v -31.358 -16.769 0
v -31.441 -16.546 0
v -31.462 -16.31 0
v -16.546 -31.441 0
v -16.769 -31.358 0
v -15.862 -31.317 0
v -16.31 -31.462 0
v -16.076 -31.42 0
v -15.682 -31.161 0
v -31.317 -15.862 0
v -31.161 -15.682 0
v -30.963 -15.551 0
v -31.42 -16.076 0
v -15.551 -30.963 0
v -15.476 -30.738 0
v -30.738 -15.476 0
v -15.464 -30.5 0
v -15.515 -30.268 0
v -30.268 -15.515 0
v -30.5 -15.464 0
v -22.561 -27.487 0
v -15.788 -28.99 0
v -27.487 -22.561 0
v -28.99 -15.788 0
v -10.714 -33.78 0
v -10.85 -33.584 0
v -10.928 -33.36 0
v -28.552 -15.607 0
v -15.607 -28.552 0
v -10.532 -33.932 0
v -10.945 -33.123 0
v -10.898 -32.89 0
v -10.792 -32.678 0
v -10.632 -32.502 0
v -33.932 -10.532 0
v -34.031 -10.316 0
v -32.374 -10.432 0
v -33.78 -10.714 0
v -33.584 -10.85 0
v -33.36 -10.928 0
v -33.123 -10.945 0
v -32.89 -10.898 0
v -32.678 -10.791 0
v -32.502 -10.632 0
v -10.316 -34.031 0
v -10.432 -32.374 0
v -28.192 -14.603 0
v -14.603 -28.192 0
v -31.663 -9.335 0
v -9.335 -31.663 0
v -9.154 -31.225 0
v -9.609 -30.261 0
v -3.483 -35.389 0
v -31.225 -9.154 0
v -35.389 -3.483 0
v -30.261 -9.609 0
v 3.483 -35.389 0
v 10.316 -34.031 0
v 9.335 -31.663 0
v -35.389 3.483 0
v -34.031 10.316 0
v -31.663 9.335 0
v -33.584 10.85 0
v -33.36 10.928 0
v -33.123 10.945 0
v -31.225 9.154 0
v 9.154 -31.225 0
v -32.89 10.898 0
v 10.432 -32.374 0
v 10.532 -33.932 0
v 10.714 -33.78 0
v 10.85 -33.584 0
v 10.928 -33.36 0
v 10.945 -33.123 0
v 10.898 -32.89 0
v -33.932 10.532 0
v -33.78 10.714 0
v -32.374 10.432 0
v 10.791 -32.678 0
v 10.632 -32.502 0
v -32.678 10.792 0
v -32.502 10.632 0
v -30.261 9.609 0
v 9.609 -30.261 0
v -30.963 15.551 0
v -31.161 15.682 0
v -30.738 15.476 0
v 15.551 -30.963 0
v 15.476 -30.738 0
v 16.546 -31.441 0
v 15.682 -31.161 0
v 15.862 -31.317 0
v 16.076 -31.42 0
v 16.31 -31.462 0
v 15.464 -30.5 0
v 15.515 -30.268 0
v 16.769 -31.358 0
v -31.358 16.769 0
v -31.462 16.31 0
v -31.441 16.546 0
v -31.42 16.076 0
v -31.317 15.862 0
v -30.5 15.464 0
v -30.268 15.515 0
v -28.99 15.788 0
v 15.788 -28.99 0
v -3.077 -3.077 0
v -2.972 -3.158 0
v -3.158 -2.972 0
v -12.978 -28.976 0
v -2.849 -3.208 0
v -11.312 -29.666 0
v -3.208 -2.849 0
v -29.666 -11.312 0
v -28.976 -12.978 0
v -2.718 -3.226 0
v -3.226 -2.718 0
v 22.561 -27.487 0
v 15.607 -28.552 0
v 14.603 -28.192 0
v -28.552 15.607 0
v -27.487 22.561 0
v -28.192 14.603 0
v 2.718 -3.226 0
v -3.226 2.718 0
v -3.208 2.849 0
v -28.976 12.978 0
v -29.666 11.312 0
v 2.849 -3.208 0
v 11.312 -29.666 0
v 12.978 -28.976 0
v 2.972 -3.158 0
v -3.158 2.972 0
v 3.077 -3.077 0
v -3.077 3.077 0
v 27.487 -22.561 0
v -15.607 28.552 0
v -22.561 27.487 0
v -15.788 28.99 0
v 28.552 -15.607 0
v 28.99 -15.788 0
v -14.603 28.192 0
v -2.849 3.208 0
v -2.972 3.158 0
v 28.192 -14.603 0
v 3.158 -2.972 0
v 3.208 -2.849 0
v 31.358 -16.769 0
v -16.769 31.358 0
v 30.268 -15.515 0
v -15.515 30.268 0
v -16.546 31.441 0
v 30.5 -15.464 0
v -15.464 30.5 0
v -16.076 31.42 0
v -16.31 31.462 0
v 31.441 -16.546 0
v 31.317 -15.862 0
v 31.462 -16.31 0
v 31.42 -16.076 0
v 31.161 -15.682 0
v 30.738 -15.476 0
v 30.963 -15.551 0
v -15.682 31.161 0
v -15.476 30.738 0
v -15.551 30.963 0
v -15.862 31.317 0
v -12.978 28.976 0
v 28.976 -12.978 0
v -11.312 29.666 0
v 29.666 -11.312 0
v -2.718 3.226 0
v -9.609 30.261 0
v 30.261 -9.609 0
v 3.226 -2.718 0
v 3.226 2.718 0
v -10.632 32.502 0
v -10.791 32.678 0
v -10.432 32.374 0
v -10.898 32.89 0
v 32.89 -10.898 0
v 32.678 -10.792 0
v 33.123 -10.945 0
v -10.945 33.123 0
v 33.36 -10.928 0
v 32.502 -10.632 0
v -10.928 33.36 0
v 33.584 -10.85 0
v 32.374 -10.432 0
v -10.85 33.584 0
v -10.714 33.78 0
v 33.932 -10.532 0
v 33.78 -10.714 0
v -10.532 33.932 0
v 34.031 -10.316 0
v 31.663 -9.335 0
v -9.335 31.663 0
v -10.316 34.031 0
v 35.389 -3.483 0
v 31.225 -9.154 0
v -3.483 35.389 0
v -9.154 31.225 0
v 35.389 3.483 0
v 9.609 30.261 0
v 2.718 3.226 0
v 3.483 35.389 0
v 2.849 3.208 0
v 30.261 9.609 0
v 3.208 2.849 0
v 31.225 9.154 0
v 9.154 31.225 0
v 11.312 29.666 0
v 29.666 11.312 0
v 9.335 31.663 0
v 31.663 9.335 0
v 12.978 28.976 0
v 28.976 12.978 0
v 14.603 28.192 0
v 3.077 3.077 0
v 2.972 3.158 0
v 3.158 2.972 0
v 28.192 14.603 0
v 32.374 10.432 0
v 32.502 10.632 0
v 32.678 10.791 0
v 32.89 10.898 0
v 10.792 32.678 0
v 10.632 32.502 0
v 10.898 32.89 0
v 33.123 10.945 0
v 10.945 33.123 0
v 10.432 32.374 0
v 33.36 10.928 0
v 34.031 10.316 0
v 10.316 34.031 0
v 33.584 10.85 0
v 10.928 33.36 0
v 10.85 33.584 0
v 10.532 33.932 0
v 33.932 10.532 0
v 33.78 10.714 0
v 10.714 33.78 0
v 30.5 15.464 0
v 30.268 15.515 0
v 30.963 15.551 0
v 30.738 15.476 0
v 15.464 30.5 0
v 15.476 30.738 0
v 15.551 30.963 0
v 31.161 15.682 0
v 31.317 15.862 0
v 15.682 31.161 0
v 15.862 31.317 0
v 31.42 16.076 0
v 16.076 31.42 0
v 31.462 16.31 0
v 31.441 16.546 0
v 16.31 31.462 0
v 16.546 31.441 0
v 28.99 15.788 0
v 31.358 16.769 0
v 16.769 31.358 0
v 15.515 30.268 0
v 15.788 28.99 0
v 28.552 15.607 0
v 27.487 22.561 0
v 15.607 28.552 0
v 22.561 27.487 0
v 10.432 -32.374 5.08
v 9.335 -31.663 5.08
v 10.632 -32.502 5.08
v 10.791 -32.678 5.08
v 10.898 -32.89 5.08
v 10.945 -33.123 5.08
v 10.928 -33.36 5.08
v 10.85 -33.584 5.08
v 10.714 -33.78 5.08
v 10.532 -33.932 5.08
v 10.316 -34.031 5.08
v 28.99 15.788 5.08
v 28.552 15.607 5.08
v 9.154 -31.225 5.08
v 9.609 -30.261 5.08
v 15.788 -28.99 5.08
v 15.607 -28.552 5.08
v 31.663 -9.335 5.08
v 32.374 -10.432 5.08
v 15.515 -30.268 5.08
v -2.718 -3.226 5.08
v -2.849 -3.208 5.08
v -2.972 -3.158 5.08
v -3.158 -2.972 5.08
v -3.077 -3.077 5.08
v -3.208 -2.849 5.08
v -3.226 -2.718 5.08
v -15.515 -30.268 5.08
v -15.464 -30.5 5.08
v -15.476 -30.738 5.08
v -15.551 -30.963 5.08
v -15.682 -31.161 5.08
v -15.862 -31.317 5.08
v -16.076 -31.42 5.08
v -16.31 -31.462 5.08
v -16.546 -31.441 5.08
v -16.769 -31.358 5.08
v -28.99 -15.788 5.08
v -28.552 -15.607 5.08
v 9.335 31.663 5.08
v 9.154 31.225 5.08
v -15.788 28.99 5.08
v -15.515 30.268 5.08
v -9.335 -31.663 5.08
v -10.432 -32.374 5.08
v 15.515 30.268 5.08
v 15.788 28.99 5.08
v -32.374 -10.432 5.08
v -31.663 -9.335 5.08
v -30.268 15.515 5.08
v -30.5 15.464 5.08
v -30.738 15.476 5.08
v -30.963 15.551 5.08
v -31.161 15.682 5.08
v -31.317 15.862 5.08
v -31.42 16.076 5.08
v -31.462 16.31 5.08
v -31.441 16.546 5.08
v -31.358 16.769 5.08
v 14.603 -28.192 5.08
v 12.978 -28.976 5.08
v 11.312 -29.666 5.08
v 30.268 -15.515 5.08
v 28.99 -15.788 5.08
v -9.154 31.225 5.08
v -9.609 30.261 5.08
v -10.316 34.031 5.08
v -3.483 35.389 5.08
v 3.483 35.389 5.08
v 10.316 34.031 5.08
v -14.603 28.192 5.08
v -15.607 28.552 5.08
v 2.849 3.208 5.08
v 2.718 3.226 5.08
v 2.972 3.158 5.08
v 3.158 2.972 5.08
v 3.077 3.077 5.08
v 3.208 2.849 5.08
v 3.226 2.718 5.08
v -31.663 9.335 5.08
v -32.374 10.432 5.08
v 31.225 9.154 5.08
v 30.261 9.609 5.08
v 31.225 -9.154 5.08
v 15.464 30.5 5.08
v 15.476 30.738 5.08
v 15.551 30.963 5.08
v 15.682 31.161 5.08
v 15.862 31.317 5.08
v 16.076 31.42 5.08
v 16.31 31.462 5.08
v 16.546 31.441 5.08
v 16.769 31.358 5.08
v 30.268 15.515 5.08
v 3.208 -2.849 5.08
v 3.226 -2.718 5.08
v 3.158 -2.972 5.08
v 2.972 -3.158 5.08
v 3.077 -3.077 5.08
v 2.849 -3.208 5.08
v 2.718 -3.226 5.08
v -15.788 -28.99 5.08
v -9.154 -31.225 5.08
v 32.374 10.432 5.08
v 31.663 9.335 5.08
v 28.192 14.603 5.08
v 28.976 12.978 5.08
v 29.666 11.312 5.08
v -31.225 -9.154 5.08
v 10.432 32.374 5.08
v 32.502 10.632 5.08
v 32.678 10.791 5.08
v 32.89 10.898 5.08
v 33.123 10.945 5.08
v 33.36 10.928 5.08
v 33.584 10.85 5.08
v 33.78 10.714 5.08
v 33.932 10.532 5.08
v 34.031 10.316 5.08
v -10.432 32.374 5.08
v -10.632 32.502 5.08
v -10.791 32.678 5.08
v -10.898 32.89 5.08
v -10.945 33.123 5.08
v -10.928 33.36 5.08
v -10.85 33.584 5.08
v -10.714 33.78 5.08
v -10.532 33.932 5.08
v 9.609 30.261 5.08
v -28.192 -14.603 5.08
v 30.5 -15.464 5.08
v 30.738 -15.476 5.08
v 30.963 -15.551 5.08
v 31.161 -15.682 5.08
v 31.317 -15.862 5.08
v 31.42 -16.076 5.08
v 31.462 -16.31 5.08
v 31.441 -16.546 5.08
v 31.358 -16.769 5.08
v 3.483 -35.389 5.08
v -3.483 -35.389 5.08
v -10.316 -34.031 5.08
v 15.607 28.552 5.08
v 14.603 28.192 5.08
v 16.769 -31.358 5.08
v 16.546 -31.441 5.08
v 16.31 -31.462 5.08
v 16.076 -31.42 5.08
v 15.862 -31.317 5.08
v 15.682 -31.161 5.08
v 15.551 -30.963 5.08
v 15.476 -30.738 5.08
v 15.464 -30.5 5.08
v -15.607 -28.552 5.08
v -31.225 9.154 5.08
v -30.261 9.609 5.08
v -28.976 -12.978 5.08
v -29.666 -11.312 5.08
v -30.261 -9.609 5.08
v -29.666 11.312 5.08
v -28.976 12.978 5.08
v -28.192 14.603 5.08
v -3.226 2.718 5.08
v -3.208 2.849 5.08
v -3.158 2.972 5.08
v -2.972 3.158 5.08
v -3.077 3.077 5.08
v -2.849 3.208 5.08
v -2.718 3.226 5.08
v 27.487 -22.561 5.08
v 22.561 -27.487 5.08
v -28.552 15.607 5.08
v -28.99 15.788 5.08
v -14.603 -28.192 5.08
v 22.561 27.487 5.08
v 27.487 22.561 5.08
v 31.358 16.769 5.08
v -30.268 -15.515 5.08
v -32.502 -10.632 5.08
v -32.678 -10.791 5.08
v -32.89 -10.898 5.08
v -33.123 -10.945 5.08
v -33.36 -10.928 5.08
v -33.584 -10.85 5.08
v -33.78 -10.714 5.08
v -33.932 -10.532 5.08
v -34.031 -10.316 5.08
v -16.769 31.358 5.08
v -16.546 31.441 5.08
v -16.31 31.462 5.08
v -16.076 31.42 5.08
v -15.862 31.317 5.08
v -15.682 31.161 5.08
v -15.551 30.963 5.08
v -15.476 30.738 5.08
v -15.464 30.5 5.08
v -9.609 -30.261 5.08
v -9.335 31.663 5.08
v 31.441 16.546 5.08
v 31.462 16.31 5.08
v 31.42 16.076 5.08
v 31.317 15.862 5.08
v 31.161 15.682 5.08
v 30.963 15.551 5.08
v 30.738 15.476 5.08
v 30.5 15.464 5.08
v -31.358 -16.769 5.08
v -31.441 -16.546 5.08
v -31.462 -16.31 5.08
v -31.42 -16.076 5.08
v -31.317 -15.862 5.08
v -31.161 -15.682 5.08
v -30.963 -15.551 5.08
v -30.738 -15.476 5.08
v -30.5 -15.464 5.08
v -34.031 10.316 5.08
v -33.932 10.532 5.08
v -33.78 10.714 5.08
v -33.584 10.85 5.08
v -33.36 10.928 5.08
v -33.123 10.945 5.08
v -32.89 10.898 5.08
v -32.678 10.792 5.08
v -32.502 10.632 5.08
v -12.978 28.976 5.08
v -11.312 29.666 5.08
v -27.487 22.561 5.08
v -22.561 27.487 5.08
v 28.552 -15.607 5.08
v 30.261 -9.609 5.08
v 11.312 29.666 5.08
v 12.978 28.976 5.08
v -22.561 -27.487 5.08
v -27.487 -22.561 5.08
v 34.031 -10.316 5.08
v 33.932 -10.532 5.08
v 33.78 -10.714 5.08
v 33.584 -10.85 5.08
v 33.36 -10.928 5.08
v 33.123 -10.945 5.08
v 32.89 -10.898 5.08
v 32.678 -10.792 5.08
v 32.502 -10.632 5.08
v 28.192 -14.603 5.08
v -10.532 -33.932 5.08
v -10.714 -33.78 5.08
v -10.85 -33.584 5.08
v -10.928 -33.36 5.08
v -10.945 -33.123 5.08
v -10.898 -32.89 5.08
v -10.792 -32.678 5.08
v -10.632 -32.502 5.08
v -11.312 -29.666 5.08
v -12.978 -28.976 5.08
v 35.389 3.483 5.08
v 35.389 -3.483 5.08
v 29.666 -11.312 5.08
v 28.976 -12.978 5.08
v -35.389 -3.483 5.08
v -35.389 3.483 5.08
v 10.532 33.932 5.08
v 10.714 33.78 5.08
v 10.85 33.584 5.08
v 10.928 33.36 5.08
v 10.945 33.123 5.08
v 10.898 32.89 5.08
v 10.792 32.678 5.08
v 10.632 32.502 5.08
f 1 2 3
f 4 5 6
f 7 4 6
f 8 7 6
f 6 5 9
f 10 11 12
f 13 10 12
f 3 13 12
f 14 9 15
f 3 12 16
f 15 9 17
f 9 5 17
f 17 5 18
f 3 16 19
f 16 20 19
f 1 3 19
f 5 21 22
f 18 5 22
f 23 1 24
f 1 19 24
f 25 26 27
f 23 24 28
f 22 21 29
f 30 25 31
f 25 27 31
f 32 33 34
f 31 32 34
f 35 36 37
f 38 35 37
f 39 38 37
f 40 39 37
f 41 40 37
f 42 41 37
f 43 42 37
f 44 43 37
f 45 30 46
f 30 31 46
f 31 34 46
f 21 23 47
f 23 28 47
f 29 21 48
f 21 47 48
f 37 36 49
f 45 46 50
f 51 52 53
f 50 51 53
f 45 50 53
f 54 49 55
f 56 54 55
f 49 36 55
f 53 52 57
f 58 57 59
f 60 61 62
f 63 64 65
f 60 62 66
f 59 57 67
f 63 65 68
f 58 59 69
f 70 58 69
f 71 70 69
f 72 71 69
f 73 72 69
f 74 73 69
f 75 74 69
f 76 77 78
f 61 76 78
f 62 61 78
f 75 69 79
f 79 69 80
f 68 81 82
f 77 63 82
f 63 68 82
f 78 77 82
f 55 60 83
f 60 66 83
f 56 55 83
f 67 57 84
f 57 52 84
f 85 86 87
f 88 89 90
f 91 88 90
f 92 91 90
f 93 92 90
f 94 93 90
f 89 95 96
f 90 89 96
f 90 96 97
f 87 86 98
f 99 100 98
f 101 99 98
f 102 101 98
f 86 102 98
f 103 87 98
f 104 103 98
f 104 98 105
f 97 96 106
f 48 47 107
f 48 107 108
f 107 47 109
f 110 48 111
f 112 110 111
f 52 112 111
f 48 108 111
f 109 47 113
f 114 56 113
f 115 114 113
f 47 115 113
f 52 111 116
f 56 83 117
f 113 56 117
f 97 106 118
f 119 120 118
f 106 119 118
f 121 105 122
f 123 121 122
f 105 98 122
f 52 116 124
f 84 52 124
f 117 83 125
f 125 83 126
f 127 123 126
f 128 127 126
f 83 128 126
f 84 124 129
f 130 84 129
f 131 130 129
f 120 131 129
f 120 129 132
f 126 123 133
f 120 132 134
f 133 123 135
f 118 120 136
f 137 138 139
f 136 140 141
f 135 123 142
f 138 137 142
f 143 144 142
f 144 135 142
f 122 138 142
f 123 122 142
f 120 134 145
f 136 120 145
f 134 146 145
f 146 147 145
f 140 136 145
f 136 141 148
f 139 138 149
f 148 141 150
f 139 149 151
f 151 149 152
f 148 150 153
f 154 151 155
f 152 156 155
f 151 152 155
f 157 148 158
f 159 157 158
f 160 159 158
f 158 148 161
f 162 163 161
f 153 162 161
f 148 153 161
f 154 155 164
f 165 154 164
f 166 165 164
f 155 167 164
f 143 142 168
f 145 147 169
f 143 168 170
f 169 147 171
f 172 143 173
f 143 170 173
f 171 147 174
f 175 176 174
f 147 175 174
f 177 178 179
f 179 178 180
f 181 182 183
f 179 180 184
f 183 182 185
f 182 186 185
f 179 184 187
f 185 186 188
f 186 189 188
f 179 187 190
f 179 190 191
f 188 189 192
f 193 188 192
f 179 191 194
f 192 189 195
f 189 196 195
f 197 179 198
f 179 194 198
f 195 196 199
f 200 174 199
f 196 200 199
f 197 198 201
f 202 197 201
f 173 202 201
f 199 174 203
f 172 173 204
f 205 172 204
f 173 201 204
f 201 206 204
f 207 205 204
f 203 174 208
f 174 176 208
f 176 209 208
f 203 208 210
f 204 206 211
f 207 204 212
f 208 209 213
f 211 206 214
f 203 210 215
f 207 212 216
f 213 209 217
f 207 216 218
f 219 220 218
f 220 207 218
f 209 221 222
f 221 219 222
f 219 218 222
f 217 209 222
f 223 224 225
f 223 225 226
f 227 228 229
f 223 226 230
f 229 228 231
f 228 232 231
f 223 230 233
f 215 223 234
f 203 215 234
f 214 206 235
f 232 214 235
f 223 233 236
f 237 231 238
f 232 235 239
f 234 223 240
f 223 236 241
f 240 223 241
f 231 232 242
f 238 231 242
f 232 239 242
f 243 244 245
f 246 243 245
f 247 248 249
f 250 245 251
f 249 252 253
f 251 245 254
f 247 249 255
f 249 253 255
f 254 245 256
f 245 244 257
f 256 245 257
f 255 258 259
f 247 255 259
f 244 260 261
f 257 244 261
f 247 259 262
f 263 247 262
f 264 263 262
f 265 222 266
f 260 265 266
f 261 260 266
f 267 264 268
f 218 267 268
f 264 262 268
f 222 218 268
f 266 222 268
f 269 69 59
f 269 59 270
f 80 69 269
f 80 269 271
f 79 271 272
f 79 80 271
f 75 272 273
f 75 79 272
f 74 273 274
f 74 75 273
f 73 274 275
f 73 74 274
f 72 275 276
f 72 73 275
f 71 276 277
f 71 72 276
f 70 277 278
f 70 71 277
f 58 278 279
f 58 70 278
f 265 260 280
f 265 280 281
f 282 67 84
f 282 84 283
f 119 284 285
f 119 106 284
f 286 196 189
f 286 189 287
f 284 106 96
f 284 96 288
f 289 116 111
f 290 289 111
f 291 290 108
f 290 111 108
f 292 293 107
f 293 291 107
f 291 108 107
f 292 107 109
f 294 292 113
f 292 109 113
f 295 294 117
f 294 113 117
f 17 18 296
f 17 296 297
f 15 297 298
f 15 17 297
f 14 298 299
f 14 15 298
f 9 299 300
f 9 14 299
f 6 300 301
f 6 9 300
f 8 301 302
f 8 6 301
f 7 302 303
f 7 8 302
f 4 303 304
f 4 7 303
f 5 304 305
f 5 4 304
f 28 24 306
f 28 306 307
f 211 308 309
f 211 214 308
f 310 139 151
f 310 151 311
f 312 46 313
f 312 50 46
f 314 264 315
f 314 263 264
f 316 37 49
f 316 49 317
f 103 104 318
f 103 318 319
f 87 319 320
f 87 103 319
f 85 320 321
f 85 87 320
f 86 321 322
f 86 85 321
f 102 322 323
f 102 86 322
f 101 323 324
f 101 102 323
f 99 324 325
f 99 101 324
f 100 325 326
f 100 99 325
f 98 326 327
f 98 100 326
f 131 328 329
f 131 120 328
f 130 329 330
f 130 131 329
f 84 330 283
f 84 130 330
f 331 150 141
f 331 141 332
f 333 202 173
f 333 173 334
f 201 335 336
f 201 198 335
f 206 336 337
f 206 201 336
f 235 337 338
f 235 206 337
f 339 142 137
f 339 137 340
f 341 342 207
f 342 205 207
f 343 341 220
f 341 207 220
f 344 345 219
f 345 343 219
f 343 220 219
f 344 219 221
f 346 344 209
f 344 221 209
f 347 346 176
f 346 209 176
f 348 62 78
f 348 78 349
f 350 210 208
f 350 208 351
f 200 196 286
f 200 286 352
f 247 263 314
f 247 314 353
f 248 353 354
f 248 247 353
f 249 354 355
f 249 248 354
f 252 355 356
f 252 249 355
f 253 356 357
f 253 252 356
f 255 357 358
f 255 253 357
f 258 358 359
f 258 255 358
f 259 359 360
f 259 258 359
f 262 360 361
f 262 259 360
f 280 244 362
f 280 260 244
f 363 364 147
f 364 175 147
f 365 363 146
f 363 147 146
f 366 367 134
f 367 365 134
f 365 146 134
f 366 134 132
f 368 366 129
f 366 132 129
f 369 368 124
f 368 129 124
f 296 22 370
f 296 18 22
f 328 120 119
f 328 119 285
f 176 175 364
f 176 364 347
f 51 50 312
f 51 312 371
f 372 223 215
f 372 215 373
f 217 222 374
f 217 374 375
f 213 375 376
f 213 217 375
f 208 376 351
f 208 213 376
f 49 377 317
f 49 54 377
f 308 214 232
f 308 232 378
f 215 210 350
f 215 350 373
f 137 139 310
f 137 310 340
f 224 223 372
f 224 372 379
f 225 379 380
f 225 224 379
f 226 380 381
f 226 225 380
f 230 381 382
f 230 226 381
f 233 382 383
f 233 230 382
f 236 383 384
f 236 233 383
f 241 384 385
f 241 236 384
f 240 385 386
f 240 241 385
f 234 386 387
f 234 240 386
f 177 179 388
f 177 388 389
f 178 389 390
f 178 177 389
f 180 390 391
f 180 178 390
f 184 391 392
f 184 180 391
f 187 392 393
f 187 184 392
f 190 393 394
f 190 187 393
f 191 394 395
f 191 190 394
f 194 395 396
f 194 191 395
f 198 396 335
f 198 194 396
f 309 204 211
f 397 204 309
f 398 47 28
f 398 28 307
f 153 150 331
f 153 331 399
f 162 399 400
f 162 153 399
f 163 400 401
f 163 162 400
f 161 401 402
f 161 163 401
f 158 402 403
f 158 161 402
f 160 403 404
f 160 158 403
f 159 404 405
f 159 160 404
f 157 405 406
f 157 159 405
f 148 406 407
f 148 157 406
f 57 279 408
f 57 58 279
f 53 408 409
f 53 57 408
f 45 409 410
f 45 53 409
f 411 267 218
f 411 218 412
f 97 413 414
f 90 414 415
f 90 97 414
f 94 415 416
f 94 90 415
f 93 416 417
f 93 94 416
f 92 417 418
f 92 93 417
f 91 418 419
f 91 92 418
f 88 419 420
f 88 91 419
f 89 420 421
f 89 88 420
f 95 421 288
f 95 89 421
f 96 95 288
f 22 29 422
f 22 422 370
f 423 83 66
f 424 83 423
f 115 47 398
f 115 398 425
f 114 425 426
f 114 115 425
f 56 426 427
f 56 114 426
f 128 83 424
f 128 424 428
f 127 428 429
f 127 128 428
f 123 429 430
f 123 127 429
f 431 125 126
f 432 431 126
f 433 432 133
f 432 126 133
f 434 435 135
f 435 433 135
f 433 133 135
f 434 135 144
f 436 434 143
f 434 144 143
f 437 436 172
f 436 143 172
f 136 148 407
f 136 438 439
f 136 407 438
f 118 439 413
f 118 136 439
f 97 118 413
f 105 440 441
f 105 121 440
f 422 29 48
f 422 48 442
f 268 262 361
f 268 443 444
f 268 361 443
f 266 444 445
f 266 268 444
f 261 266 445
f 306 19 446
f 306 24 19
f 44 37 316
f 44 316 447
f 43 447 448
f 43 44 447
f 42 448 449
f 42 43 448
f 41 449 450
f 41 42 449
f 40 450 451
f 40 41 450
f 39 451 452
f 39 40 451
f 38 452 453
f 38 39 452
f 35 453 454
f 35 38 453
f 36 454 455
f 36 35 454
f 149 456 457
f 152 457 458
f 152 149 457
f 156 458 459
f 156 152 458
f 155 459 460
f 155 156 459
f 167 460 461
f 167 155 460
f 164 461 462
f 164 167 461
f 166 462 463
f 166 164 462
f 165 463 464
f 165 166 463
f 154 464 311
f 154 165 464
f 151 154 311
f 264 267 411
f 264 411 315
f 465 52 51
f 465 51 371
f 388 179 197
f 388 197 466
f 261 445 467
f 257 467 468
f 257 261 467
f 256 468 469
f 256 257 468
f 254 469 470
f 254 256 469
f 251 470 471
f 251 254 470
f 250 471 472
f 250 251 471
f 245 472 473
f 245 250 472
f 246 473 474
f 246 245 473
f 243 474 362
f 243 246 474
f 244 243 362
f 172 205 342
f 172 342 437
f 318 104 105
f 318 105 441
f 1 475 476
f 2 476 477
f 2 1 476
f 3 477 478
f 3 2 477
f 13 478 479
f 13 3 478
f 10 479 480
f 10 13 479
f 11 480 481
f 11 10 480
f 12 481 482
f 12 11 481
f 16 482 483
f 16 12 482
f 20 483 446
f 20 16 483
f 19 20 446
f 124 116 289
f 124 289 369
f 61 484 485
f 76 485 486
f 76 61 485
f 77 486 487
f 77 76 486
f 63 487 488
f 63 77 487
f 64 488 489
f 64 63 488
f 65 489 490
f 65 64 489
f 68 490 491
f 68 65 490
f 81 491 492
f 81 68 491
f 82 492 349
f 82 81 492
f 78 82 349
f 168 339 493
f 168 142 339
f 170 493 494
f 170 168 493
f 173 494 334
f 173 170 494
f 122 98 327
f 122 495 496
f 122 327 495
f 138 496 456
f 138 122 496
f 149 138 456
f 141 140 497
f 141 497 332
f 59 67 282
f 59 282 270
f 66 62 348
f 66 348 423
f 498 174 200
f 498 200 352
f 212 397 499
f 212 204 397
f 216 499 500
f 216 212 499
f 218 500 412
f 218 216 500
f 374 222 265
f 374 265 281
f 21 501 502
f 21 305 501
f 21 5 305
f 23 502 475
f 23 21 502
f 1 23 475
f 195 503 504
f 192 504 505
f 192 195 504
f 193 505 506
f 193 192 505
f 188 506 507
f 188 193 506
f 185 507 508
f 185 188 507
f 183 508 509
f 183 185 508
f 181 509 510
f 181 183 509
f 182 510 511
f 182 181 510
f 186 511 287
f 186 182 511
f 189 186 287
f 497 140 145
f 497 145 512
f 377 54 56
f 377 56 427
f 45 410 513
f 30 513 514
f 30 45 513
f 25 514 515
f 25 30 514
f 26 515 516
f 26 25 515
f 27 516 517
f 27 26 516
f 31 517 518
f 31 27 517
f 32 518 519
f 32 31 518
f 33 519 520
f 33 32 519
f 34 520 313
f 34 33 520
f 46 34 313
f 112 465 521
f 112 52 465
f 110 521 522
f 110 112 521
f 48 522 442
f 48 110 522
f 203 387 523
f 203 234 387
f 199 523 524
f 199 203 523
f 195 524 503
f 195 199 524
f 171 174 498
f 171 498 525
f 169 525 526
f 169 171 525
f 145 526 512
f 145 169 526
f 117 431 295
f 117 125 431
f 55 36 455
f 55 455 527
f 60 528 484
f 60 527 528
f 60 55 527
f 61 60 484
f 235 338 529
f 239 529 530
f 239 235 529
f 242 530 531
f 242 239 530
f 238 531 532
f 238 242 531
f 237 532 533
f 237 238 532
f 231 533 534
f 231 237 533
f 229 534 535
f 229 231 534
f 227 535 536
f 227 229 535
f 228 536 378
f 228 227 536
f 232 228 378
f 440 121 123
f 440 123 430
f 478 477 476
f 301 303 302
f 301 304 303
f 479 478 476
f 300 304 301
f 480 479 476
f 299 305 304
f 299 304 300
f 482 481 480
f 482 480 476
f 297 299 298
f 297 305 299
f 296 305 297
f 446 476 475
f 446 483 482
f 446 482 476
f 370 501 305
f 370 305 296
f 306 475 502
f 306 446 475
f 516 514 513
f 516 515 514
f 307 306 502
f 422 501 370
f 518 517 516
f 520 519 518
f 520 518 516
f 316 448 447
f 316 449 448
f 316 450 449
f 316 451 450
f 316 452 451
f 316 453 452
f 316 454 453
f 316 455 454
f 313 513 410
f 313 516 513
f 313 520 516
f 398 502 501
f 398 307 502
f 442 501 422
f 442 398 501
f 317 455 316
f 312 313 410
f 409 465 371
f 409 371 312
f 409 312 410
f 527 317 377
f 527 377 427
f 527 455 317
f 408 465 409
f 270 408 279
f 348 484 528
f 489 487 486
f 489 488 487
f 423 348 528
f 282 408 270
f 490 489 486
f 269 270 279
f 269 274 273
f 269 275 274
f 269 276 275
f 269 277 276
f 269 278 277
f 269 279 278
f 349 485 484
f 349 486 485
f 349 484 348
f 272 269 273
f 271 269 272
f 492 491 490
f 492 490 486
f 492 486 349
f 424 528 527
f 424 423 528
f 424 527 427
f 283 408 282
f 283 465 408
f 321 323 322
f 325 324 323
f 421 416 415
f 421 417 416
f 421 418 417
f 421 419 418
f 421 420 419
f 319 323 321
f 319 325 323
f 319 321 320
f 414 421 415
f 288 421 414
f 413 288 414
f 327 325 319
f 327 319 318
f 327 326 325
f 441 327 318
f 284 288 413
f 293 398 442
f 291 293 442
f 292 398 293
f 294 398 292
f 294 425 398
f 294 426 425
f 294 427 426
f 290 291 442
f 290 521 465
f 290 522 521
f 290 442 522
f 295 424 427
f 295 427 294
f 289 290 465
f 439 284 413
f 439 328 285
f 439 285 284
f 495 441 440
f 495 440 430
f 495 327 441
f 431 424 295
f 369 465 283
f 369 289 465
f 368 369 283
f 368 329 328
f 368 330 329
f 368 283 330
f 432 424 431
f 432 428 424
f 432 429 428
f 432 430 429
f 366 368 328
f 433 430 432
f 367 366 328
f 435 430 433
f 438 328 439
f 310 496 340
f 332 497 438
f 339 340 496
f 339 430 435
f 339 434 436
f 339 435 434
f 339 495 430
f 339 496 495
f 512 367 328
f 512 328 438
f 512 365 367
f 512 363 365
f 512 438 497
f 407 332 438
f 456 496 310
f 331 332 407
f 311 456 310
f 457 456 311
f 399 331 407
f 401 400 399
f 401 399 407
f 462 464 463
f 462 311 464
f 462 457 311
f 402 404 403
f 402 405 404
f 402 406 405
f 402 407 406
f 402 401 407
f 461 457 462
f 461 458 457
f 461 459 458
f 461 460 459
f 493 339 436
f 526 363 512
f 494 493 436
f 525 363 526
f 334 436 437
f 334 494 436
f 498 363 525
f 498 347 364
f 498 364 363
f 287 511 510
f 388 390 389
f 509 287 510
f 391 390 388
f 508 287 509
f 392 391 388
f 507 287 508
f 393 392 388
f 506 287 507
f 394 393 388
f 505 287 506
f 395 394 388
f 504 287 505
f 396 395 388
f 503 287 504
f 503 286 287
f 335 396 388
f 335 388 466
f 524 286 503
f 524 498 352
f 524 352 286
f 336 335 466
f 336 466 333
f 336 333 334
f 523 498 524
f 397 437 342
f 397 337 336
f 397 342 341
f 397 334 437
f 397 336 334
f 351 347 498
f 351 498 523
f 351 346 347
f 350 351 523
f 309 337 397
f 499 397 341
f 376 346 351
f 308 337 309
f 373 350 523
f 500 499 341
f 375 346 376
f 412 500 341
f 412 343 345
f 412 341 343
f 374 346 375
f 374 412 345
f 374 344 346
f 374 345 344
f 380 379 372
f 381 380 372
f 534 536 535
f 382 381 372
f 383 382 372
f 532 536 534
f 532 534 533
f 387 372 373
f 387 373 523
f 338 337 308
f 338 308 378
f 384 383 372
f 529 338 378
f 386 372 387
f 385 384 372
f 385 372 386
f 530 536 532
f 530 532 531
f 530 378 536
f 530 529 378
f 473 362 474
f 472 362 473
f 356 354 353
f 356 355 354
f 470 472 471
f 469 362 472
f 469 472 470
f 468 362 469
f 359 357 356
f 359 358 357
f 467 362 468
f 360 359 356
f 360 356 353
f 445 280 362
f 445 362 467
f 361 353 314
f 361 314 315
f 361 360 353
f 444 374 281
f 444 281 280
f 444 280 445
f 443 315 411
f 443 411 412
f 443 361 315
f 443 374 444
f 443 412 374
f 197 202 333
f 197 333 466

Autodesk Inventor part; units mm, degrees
ref_plane "YZ Plane" through (0, 0, 0) normal (1, 0, 0) x (0, 1, 0)
ref_plane "XZ Plane" through (0, 0, 0) normal (0, 1, 0) x (-1, 0, 0)
ref_plane "XY Plane" through (0, 0, 0) normal (0, 0, 1) x (1, 0, 0)
sketch "Sketch1" plane through (0, 0, 0) normal (0, 0, 1) x (1, 0, 0)
  circle A0 centre (0, 0) radius 31.75
  line L0 (-2.7178, -3.2258) -> (2.7178, -3.2258)
  line L1 (3.2258, -2.7178) -> (3.2258, 2.7178)
  line L2 (2.7178, 3.2258) -> (-2.7178, 3.2258)
  line L3 (-3.2258, 2.7178) -> (-3.2258, -2.7178)
  line L4 (-3.2258, -3.2258) -> (3.2258, 3.2258) construction
  line L5 (3.2258, -3.2258) -> (-3.2258, 3.2258) construction
  arc A1 (-2.7178, 3.2258) -> (-3.2258, 2.7178) centre (-2.7178, 2.7178) ccw
  arc A2 (3.2258, 2.7178) -> (2.7178, 3.2258) centre (2.7178, 2.7178) ccw
  arc A3 (2.7178, -3.2258) -> (3.2258, -2.7178) centre (2.7178, -2.7178) ccw
  arc A4 (-3.2258, -2.7178) -> (-2.7178, -3.2258) centre (-2.7178, -2.7178) ccw
  line L6 (-12.1502, 29.3332) -> (-12.1502, -29.3332) construction
  line L7 (12.1502, 29.3332) -> (12.1502, -29.3332) construction
  line L8 (29.3332, 12.1502) -> (-29.3332, 12.1502) construction
  line L9 (-29.3332, -12.1502) -> (29.3332, -12.1502) construction
  line L10 (12.1502, 29.3332) -> (29.3332, 12.1502) construction
  line L11 (29.3332, 12.1502) -> (29.3332, -12.1502) construction
  line L12 (29.3332, -12.1502) -> (12.1502, -29.3332) construction
  line L13 (12.1502, -29.3332) -> (-12.1502, -29.3332) construction
  line L14 (-12.1502, -29.3332) -> (-29.3332, -12.1502) construction
  line L15 (-29.3332, -12.1502) -> (-29.3332, 12.1502) construction
  line L16 (-29.3332, 12.1502) -> (-12.1502, 29.3332) construction
  line L17 (-12.1502, 29.3332) -> (12.1502, 29.3332) construction
  circle A5 centre (0, 0) radius 35.56
  line L18 (0, 0) -> (13.6082, 32.8532) construction
  line L19 (10.3158, 34.0308) -> (8.8498, 30.4917)
  line L20 (15.3031, 27.8186) -> (16.7691, 31.3578)
  arc A6 (9.6387, 32.3961) -> (10.3158, 34.0308) centre (10.0579, 33.1801) ccw
  arc A7 (16.7691, 31.3578) -> (16.092, 29.7231) centre (16.3499, 30.5739) ccw
  point P0 (16.092, 29.7231)
  dimension "d4" = 63.5
  dimension "d2" = 0.508
  dimension "d3" = 6.4516
  dimension "d9" = 6.985
  dimension "d10" = 3.81
  dimension "d11" = 0.889
extrude "Extrusion1" add sketch "Sketch1" along normal blind 5.08
extrude "Extrusion2" cut sketch "Sketch1" along normal through all contours A0 L19 A6 A5 A7 L20
chamfer "Chamfer2" distance 0.7937 angle 45 4 edges at (9.6387, 32.3961, 2.54) (8.8498, 30.4917, 2.54) (15.3031, 27.8186, 2.54) (16.092, 29.7231, 2.54)
pattern_circular "Circular Pattern1" count 8 over 360 about axis through (0, 0, 0) along (0, 0, 1) of "Extrusion2", "Chamfer2"
properties part number "2in rubberband wheel"
